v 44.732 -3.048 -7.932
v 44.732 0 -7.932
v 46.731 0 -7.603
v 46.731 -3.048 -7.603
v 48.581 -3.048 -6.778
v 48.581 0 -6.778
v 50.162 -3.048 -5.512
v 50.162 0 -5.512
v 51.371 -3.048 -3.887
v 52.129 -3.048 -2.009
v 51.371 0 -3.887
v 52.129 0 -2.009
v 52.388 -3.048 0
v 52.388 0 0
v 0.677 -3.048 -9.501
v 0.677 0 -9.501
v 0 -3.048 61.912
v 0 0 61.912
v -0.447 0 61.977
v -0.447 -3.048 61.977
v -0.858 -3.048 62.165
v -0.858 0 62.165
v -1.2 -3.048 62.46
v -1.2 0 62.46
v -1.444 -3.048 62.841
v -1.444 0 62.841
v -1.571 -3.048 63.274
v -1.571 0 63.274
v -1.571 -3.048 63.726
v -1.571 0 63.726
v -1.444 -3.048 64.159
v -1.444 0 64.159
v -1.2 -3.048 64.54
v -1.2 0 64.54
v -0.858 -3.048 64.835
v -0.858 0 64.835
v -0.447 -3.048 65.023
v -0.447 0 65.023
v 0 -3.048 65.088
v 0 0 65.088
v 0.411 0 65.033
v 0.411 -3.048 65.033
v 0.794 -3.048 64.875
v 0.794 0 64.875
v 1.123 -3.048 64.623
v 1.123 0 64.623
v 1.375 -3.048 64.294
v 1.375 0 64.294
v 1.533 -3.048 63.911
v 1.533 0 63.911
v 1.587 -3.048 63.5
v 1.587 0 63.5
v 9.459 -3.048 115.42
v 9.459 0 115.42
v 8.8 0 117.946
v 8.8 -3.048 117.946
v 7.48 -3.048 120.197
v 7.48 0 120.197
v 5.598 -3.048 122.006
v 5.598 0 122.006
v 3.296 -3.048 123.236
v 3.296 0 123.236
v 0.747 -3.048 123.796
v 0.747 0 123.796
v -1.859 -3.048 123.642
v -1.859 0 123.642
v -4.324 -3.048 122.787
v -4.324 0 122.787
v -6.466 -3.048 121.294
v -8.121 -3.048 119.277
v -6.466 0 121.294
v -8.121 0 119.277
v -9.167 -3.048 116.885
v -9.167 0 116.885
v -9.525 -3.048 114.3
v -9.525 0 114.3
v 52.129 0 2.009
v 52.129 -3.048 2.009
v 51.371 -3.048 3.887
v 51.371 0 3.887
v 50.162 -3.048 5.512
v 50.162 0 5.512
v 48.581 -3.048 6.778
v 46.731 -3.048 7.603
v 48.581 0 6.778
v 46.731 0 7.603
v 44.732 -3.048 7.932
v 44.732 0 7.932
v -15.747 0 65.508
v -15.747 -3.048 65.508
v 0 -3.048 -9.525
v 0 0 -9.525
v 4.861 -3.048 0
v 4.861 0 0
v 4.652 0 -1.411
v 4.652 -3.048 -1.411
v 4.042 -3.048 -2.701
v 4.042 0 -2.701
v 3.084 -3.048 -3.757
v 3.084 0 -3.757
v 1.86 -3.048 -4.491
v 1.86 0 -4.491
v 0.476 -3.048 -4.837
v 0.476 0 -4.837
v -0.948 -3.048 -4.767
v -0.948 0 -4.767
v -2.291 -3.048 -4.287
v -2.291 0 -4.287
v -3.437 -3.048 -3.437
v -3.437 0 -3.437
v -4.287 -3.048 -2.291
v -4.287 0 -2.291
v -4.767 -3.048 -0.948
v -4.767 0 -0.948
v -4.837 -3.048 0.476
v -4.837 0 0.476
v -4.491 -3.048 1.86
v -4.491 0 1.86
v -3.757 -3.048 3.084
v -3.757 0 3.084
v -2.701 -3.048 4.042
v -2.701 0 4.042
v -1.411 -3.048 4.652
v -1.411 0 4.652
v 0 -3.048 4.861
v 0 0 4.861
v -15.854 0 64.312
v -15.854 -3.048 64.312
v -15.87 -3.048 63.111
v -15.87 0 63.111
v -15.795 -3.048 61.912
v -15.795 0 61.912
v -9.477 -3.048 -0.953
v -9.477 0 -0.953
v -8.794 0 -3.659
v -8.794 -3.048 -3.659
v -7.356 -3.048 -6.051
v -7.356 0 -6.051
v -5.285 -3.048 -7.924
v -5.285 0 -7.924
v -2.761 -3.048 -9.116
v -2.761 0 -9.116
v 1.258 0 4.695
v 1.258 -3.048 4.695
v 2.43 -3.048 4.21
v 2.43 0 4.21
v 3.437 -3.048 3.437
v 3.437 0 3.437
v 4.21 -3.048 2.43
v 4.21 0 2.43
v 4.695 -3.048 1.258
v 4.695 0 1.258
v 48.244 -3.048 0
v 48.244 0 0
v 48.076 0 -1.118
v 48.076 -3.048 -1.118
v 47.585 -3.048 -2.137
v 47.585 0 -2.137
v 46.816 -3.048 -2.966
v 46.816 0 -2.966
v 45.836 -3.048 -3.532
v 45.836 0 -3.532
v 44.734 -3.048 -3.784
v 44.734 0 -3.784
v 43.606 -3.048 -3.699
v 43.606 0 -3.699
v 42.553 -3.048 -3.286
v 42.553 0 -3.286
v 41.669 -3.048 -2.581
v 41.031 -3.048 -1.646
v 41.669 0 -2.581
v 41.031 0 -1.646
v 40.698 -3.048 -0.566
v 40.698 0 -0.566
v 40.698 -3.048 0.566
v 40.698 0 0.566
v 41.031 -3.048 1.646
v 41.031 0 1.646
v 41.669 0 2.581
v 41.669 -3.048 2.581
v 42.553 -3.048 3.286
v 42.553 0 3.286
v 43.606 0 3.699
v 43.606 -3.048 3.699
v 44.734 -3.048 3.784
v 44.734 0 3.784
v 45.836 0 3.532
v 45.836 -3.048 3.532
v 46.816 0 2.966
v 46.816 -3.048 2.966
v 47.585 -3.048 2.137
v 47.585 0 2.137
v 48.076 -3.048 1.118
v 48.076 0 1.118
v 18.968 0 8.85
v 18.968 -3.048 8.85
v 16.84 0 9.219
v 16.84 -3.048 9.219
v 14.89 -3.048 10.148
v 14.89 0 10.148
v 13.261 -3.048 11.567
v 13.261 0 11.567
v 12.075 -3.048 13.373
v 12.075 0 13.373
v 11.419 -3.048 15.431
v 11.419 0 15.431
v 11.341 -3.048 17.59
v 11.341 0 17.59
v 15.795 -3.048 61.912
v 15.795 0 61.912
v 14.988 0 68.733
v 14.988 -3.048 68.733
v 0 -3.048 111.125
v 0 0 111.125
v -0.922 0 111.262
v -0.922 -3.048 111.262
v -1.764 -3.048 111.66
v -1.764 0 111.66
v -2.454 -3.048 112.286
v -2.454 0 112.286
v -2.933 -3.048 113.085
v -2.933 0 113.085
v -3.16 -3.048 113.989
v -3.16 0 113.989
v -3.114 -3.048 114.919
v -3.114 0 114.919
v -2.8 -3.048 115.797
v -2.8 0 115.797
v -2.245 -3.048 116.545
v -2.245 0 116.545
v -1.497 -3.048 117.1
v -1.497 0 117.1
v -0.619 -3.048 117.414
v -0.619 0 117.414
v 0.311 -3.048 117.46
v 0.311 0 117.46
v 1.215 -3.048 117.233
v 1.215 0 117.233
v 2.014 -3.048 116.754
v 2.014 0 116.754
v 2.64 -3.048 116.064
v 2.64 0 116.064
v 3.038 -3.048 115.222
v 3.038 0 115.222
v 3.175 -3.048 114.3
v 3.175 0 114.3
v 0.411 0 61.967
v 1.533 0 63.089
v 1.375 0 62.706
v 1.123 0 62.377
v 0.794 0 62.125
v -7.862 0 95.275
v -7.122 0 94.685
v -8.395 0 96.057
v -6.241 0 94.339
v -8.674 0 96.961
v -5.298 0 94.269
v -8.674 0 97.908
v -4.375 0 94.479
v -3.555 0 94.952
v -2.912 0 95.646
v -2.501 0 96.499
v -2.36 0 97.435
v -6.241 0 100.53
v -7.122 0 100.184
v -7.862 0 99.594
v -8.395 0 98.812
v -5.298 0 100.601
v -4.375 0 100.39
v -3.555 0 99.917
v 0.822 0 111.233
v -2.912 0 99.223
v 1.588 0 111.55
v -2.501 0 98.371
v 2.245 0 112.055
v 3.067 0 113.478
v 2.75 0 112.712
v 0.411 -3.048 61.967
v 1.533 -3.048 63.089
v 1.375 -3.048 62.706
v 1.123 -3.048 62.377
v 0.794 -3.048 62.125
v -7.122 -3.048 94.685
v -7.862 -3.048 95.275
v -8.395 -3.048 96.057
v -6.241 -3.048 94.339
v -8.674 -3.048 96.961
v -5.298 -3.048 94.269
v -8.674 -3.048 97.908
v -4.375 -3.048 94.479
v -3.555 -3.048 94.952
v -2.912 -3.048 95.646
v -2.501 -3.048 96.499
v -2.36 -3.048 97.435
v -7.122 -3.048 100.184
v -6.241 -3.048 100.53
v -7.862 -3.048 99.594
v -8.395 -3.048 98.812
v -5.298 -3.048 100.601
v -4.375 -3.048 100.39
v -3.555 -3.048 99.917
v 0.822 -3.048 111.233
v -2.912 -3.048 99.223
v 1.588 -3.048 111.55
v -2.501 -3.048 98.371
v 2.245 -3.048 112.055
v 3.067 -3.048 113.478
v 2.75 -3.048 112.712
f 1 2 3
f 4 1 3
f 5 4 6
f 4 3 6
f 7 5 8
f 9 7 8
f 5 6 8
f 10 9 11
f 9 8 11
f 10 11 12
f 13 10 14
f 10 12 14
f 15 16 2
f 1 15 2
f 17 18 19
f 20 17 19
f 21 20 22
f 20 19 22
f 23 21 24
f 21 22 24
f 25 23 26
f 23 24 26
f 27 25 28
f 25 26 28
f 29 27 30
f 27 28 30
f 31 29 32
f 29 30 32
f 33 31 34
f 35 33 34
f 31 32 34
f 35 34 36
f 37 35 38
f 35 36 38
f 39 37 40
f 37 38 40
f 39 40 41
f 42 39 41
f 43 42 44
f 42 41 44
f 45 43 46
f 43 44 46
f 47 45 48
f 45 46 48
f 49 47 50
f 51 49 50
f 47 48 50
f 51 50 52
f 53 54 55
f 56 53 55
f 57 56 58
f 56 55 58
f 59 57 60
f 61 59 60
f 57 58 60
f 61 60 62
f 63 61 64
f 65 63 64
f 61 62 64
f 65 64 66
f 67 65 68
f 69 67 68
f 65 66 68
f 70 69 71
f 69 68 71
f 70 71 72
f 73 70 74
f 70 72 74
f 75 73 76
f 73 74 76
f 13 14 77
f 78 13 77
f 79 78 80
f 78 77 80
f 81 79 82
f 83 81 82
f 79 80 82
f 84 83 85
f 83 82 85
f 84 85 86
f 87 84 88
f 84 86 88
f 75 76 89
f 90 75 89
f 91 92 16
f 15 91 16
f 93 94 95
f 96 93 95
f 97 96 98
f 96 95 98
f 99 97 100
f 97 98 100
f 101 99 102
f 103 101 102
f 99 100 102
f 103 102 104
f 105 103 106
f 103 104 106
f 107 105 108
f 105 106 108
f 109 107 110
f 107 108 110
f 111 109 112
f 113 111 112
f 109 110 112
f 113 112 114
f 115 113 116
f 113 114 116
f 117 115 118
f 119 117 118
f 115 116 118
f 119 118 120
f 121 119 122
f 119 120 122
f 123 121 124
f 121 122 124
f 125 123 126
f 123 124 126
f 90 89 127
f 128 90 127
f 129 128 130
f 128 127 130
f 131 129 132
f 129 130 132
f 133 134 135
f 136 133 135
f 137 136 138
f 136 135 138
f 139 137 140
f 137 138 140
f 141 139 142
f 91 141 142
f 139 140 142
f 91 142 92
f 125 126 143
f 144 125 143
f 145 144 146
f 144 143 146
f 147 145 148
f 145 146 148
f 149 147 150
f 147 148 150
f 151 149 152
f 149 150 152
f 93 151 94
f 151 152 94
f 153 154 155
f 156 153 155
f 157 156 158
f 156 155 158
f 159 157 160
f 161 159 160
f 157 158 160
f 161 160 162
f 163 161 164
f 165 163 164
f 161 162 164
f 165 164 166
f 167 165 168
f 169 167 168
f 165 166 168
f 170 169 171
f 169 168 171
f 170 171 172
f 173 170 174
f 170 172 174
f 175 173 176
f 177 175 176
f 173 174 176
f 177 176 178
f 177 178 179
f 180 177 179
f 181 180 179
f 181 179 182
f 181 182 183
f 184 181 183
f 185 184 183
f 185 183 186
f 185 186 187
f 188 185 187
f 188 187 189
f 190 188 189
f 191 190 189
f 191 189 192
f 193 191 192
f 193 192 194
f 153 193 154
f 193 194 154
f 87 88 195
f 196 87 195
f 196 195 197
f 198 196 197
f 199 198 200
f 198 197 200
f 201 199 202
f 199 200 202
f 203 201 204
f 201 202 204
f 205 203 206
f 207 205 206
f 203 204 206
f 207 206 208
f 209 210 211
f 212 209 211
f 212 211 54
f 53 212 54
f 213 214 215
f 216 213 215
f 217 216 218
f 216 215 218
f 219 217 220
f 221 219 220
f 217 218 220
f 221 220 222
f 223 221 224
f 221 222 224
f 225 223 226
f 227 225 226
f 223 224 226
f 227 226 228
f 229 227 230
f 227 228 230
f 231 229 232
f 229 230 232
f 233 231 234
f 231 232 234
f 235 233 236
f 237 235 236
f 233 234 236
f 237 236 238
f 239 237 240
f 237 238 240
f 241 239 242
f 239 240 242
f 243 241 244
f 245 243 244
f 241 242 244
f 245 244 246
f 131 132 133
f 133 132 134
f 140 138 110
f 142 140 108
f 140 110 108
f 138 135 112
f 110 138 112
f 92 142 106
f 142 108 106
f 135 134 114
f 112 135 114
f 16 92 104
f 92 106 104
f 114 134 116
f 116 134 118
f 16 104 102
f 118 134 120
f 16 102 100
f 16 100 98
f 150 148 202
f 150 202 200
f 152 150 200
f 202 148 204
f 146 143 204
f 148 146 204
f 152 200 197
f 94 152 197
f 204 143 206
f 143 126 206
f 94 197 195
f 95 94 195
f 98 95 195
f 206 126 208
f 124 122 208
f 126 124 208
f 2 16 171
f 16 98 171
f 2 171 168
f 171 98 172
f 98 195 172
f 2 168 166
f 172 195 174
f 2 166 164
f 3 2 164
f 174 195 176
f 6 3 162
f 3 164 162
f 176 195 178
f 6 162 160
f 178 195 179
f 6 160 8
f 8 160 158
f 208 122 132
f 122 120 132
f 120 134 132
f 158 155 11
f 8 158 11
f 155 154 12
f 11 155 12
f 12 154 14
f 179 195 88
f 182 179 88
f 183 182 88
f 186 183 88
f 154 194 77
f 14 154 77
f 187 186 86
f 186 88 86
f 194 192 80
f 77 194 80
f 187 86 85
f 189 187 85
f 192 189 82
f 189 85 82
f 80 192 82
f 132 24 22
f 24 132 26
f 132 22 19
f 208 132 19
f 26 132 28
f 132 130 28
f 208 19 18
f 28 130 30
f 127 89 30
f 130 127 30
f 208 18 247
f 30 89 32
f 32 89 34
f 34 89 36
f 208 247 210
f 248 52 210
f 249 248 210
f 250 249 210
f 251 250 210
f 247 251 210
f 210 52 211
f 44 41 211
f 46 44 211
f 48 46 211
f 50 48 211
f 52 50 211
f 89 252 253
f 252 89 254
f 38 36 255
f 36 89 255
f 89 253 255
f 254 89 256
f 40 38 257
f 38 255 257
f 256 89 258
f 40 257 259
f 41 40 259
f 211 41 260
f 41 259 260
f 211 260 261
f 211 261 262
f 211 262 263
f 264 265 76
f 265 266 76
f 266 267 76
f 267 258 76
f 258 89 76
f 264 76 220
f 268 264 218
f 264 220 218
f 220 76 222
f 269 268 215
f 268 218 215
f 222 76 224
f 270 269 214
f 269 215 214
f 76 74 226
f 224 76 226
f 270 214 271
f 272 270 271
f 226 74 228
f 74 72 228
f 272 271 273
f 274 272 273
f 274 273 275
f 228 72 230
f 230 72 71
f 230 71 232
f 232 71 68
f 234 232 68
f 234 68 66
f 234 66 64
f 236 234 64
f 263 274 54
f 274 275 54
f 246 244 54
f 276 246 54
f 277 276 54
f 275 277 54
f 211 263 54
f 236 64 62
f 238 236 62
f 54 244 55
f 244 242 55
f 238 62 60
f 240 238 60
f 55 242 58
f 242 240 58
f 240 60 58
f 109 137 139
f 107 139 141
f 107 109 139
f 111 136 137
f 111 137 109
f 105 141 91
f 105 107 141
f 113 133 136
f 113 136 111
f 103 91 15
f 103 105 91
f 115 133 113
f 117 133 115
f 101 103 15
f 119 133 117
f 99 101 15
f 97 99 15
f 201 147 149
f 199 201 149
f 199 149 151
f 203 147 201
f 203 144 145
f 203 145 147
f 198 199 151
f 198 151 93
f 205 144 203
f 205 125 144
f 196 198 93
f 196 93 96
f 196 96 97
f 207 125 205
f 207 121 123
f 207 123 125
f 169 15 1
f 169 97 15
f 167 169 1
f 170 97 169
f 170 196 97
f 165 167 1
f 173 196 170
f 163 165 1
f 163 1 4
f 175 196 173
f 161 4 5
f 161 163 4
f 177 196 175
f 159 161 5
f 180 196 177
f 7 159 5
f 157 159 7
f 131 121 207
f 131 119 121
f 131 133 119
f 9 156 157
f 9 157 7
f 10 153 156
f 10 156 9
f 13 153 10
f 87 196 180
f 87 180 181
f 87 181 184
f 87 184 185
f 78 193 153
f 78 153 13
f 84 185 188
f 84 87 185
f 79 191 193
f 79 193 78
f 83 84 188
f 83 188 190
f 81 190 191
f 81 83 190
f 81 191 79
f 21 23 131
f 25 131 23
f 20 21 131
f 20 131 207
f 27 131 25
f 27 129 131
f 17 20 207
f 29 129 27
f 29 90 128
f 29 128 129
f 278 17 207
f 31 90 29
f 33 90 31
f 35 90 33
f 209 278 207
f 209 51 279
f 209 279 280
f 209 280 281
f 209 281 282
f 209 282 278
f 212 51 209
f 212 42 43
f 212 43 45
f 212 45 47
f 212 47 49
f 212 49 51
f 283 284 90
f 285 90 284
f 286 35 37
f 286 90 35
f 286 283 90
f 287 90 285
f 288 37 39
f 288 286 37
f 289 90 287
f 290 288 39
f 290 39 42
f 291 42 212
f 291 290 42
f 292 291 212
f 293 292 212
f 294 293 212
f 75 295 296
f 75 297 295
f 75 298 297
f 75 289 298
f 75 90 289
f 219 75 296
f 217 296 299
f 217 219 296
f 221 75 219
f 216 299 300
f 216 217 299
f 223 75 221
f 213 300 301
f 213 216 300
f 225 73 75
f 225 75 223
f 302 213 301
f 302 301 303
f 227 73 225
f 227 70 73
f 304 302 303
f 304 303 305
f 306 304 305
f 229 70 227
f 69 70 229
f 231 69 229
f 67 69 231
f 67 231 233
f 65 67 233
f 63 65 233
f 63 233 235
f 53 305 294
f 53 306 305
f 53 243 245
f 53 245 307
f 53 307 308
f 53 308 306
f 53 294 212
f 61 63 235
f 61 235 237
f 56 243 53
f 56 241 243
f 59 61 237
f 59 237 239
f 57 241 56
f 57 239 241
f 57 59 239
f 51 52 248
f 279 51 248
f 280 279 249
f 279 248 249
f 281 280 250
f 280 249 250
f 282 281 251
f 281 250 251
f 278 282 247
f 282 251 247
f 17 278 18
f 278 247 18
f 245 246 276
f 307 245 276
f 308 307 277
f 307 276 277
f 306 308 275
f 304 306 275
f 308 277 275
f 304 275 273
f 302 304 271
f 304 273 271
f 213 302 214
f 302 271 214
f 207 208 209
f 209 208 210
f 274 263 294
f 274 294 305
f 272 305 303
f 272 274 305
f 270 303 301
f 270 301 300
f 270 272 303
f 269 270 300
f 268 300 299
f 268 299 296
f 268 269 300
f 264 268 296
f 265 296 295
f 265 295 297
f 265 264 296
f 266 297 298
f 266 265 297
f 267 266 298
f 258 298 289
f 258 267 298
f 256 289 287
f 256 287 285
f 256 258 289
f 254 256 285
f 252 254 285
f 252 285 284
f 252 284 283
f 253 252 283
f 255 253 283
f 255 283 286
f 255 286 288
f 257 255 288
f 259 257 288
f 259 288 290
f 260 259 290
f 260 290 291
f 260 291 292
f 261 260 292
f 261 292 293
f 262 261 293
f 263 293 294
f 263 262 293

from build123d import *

# Parameters (mm, degrees)
F0_R     = 3.175
F1_DEPTH = 3.048


with BuildPart() as f1:
    # F0 (on Front) → F1 (new body)
    with BuildSketch(Plane.XZ):
        with BuildLine():
            ThreePointArc((-9.525, 114.3), (-6.7351920908, 107.5648079092), (0, 104.775))
            ThreePointArc((0, 104.775), (6.7351920908, 107.5648079092), (9.525, 114.3))
            ThreePointArc((9.525, 114.3), (9.5084619879, 114.8610486832), (9.4589053806, 115.4201490977))
            ThreePointArc((9.4589053806, 115.4201490977), (-0.5610486832, 123.8084619879), (-9.525, 114.3))
        make_face()
        with BuildLine():
            ThreePointArc((3.175, 114.3), (2.2450640303, 112.0549359697), (0, 111.125))
            ThreePointArc((0, 111.125), (-2.2450640303, 116.5450640303), (3.175, 114.3))
        make_face(mode=Mode.SUBTRACT)
        with BuildLine():
            ThreePointArc((9.525, 114.3), (6.7351920908, 107.5648079092), (0, 104.775))
            Line((0, 104.775), (0, 79.375))
            ThreePointArc((0, 79.375), (9.1908363712, 76.4438847259), (14.9877324754, 68.7329246359))
            Line((14.9877324754, 68.7329246359), (9.4589053806, 115.4201490977))
            ThreePointArc((9.4589053806, 115.4201490977), (9.5084619879, 114.8610486832), (9.525, 114.3))
        make_face()
        with BuildLine():
            Line((0, 79.375), (0, 104.775))
            ThreePointArc((0, 104.775), (-6.7351920908, 107.5648079092), (-9.525, 114.3))
            Line((-9.525, 114.3), (-15.7474569047, 65.5082893304))
            ThreePointArc((-15.7474569047, 65.5082893304), (-10.4912828548, 75.4142187767), (0, 79.375))
        make_face()
        with Locations((-5.5348160677, 97.4346920848)):
            Circle(F0_R, mode=Mode.SUBTRACT)
        with BuildLine():
            ThreePointArc((14.9877324754, 68.7329246359), (9.1908363712, 76.4438847259), (0, 79.375))
            Line((0, 79.375), (0, 65.0875))
            ThreePointArc((0, 65.0875), (1.1225320151, 64.6225320151), (1.5875, 63.5))
            ThreePointArc((1.5875, 63.5), (1.1225320151, 62.3774679849), (0, 61.9125))
            Line((0, 61.9125), (0, 47.625))
            ThreePointArc((0, 47.625), (10.6492737428, 51.7267849017), (15.7954255641, 61.9125))
            Line((15.7954255641, 61.9125), (14.9877324754, 68.7329246359))
        make_face()
        with BuildLine():
            Line((0, 65.0875), (0, 79.375))
            ThreePointArc((0, 79.375), (-10.4912828548, 75.4142187767), (-15.7474569047, 65.5082893304))
            ThreePointArc((-15.7474569047, 65.5082893304), (-15.8735876171, 63.7117573215), (-15.7954255641, 61.9125))
            ThreePointArc((-15.7954255641, 61.9125), (-10.6492737428, 51.7267849017), (0, 47.625))
            Line((0, 47.625), (0, 61.9125))
            ThreePointArc((0, 61.9125), (-1.5875, 63.5), (0, 65.0875))
        make_face()
        with BuildLine():
            Line((11.3408358685, 17.5898921545), (15.7954255641, 61.9125))
            ThreePointArc((15.7954255641, 61.9125), (10.6492737428, 51.7267849017), (0, 47.625))
            Line((0, 47.625), (0, 9.525))
            ThreePointArc((0, 9.525), (6.7351920908, 6.7351920908), (9.525, 0))
            Line((9.525, 0), (36.5125, 0))
            ThreePointArc((36.5125, 0), (38.9380895153, 5.7116327839), (44.7324052746, 7.9324746146))
            Line((44.7324052746, 7.9324746146), (18.968327868, 8.8497055806))
            ThreePointArc((18.968327868, 8.8497055806), (13.2612039825, 11.5674628959), (11.3408358685, 17.5898921545))
        make_face()
        with BuildLine():
            ThreePointArc((0, 47.625), (-10.6492737428, 51.7267849017), (-15.7954255641, 61.9125))
            Line((-15.7954255641, 61.9125), (-9.4772553384, -0.9525))
            ThreePointArc((-9.4772553384, -0.9525), (-7.063929059, 6.3895642457), (0, 9.525))
            Line((0, 9.525), (0, 47.625))
        make_face()
        with BuildLine():
            ThreePointArc((0, 9.525), (-7.063929059, 6.3895642457), (-9.4772553384, -0.9525))
            ThreePointArc((-9.4772553384, -0.9525), (-6.3895642457, -7.063929059), (0, -9.525))
            Line((0, -9.525), (0.6773435479, -9.500885786))
            ThreePointArc((0.6773435479, -9.500885786), (6.9705567315, -6.4912990883), (9.525, 0))
            Line((9.525, 0), (4.8608528189, 0))
            ThreePointArc((4.8608528189, 0), (-3.4371419906, -3.4371419906), (0, 4.8608528189))
            Line((0, 4.8608528189), (0, 9.525))
        make_face()
        with BuildLine():
            ThreePointArc((9.525, 0), (6.7351920908, 6.7351920908), (0, 9.525))
            Line((0, 9.525), (0, 4.8608528189))
            ThreePointArc((0, 4.8608528189), (3.4371419906, 3.4371419906), (4.8608528189, 0))
            Line((4.8608528189, 0), (9.525, 0))
        make_face()
        with BuildLine():
            Line((36.5125, 0), (9.525, 0))
            ThreePointArc((9.525, 0), (6.9705567315, -6.4912990883), (0.6773435479, -9.500885786))
            Line((0.6773435479, -9.500885786), (44.7324052746, -7.9324746146))
            ThreePointArc((44.7324052746, -7.9324746146), (38.9380895153, -5.7116327839), (36.5125, 0))
        make_face()
        with BuildLine():
            ThreePointArc((52.3875, 0), (50.1616327839, 5.5119104847), (44.7324052746, 7.9324746146))
            ThreePointArc((44.7324052746, 7.9324746146), (38.9380895153, 5.7116327839), (36.5125, 0))
            Line((36.5125, 0), (40.655729, 0))
            ThreePointArc((40.655729, 0), (44.45, 3.794271), (48.244271, 0))
            Line((48.244271, 0), (52.3875, 0))
        make_face()
        with BuildLine():
            Line((40.655729, 0), (36.5125, 0))
            ThreePointArc((36.5125, 0), (38.9380895153, -5.7116327839), (44.7324052746, -7.9324746146))
            ThreePointArc((44.7324052746, -7.9324746146), (50.1616327839, -5.5119104847), (52.3875, 0))
            Line((52.3875, 0), (48.244271, 0))
            ThreePointArc((48.244271, 0), (44.45, -3.794271), (40.655729, 0))
        make_face()
    extrude(amount=F1_DEPTH)


solid = f1.part
